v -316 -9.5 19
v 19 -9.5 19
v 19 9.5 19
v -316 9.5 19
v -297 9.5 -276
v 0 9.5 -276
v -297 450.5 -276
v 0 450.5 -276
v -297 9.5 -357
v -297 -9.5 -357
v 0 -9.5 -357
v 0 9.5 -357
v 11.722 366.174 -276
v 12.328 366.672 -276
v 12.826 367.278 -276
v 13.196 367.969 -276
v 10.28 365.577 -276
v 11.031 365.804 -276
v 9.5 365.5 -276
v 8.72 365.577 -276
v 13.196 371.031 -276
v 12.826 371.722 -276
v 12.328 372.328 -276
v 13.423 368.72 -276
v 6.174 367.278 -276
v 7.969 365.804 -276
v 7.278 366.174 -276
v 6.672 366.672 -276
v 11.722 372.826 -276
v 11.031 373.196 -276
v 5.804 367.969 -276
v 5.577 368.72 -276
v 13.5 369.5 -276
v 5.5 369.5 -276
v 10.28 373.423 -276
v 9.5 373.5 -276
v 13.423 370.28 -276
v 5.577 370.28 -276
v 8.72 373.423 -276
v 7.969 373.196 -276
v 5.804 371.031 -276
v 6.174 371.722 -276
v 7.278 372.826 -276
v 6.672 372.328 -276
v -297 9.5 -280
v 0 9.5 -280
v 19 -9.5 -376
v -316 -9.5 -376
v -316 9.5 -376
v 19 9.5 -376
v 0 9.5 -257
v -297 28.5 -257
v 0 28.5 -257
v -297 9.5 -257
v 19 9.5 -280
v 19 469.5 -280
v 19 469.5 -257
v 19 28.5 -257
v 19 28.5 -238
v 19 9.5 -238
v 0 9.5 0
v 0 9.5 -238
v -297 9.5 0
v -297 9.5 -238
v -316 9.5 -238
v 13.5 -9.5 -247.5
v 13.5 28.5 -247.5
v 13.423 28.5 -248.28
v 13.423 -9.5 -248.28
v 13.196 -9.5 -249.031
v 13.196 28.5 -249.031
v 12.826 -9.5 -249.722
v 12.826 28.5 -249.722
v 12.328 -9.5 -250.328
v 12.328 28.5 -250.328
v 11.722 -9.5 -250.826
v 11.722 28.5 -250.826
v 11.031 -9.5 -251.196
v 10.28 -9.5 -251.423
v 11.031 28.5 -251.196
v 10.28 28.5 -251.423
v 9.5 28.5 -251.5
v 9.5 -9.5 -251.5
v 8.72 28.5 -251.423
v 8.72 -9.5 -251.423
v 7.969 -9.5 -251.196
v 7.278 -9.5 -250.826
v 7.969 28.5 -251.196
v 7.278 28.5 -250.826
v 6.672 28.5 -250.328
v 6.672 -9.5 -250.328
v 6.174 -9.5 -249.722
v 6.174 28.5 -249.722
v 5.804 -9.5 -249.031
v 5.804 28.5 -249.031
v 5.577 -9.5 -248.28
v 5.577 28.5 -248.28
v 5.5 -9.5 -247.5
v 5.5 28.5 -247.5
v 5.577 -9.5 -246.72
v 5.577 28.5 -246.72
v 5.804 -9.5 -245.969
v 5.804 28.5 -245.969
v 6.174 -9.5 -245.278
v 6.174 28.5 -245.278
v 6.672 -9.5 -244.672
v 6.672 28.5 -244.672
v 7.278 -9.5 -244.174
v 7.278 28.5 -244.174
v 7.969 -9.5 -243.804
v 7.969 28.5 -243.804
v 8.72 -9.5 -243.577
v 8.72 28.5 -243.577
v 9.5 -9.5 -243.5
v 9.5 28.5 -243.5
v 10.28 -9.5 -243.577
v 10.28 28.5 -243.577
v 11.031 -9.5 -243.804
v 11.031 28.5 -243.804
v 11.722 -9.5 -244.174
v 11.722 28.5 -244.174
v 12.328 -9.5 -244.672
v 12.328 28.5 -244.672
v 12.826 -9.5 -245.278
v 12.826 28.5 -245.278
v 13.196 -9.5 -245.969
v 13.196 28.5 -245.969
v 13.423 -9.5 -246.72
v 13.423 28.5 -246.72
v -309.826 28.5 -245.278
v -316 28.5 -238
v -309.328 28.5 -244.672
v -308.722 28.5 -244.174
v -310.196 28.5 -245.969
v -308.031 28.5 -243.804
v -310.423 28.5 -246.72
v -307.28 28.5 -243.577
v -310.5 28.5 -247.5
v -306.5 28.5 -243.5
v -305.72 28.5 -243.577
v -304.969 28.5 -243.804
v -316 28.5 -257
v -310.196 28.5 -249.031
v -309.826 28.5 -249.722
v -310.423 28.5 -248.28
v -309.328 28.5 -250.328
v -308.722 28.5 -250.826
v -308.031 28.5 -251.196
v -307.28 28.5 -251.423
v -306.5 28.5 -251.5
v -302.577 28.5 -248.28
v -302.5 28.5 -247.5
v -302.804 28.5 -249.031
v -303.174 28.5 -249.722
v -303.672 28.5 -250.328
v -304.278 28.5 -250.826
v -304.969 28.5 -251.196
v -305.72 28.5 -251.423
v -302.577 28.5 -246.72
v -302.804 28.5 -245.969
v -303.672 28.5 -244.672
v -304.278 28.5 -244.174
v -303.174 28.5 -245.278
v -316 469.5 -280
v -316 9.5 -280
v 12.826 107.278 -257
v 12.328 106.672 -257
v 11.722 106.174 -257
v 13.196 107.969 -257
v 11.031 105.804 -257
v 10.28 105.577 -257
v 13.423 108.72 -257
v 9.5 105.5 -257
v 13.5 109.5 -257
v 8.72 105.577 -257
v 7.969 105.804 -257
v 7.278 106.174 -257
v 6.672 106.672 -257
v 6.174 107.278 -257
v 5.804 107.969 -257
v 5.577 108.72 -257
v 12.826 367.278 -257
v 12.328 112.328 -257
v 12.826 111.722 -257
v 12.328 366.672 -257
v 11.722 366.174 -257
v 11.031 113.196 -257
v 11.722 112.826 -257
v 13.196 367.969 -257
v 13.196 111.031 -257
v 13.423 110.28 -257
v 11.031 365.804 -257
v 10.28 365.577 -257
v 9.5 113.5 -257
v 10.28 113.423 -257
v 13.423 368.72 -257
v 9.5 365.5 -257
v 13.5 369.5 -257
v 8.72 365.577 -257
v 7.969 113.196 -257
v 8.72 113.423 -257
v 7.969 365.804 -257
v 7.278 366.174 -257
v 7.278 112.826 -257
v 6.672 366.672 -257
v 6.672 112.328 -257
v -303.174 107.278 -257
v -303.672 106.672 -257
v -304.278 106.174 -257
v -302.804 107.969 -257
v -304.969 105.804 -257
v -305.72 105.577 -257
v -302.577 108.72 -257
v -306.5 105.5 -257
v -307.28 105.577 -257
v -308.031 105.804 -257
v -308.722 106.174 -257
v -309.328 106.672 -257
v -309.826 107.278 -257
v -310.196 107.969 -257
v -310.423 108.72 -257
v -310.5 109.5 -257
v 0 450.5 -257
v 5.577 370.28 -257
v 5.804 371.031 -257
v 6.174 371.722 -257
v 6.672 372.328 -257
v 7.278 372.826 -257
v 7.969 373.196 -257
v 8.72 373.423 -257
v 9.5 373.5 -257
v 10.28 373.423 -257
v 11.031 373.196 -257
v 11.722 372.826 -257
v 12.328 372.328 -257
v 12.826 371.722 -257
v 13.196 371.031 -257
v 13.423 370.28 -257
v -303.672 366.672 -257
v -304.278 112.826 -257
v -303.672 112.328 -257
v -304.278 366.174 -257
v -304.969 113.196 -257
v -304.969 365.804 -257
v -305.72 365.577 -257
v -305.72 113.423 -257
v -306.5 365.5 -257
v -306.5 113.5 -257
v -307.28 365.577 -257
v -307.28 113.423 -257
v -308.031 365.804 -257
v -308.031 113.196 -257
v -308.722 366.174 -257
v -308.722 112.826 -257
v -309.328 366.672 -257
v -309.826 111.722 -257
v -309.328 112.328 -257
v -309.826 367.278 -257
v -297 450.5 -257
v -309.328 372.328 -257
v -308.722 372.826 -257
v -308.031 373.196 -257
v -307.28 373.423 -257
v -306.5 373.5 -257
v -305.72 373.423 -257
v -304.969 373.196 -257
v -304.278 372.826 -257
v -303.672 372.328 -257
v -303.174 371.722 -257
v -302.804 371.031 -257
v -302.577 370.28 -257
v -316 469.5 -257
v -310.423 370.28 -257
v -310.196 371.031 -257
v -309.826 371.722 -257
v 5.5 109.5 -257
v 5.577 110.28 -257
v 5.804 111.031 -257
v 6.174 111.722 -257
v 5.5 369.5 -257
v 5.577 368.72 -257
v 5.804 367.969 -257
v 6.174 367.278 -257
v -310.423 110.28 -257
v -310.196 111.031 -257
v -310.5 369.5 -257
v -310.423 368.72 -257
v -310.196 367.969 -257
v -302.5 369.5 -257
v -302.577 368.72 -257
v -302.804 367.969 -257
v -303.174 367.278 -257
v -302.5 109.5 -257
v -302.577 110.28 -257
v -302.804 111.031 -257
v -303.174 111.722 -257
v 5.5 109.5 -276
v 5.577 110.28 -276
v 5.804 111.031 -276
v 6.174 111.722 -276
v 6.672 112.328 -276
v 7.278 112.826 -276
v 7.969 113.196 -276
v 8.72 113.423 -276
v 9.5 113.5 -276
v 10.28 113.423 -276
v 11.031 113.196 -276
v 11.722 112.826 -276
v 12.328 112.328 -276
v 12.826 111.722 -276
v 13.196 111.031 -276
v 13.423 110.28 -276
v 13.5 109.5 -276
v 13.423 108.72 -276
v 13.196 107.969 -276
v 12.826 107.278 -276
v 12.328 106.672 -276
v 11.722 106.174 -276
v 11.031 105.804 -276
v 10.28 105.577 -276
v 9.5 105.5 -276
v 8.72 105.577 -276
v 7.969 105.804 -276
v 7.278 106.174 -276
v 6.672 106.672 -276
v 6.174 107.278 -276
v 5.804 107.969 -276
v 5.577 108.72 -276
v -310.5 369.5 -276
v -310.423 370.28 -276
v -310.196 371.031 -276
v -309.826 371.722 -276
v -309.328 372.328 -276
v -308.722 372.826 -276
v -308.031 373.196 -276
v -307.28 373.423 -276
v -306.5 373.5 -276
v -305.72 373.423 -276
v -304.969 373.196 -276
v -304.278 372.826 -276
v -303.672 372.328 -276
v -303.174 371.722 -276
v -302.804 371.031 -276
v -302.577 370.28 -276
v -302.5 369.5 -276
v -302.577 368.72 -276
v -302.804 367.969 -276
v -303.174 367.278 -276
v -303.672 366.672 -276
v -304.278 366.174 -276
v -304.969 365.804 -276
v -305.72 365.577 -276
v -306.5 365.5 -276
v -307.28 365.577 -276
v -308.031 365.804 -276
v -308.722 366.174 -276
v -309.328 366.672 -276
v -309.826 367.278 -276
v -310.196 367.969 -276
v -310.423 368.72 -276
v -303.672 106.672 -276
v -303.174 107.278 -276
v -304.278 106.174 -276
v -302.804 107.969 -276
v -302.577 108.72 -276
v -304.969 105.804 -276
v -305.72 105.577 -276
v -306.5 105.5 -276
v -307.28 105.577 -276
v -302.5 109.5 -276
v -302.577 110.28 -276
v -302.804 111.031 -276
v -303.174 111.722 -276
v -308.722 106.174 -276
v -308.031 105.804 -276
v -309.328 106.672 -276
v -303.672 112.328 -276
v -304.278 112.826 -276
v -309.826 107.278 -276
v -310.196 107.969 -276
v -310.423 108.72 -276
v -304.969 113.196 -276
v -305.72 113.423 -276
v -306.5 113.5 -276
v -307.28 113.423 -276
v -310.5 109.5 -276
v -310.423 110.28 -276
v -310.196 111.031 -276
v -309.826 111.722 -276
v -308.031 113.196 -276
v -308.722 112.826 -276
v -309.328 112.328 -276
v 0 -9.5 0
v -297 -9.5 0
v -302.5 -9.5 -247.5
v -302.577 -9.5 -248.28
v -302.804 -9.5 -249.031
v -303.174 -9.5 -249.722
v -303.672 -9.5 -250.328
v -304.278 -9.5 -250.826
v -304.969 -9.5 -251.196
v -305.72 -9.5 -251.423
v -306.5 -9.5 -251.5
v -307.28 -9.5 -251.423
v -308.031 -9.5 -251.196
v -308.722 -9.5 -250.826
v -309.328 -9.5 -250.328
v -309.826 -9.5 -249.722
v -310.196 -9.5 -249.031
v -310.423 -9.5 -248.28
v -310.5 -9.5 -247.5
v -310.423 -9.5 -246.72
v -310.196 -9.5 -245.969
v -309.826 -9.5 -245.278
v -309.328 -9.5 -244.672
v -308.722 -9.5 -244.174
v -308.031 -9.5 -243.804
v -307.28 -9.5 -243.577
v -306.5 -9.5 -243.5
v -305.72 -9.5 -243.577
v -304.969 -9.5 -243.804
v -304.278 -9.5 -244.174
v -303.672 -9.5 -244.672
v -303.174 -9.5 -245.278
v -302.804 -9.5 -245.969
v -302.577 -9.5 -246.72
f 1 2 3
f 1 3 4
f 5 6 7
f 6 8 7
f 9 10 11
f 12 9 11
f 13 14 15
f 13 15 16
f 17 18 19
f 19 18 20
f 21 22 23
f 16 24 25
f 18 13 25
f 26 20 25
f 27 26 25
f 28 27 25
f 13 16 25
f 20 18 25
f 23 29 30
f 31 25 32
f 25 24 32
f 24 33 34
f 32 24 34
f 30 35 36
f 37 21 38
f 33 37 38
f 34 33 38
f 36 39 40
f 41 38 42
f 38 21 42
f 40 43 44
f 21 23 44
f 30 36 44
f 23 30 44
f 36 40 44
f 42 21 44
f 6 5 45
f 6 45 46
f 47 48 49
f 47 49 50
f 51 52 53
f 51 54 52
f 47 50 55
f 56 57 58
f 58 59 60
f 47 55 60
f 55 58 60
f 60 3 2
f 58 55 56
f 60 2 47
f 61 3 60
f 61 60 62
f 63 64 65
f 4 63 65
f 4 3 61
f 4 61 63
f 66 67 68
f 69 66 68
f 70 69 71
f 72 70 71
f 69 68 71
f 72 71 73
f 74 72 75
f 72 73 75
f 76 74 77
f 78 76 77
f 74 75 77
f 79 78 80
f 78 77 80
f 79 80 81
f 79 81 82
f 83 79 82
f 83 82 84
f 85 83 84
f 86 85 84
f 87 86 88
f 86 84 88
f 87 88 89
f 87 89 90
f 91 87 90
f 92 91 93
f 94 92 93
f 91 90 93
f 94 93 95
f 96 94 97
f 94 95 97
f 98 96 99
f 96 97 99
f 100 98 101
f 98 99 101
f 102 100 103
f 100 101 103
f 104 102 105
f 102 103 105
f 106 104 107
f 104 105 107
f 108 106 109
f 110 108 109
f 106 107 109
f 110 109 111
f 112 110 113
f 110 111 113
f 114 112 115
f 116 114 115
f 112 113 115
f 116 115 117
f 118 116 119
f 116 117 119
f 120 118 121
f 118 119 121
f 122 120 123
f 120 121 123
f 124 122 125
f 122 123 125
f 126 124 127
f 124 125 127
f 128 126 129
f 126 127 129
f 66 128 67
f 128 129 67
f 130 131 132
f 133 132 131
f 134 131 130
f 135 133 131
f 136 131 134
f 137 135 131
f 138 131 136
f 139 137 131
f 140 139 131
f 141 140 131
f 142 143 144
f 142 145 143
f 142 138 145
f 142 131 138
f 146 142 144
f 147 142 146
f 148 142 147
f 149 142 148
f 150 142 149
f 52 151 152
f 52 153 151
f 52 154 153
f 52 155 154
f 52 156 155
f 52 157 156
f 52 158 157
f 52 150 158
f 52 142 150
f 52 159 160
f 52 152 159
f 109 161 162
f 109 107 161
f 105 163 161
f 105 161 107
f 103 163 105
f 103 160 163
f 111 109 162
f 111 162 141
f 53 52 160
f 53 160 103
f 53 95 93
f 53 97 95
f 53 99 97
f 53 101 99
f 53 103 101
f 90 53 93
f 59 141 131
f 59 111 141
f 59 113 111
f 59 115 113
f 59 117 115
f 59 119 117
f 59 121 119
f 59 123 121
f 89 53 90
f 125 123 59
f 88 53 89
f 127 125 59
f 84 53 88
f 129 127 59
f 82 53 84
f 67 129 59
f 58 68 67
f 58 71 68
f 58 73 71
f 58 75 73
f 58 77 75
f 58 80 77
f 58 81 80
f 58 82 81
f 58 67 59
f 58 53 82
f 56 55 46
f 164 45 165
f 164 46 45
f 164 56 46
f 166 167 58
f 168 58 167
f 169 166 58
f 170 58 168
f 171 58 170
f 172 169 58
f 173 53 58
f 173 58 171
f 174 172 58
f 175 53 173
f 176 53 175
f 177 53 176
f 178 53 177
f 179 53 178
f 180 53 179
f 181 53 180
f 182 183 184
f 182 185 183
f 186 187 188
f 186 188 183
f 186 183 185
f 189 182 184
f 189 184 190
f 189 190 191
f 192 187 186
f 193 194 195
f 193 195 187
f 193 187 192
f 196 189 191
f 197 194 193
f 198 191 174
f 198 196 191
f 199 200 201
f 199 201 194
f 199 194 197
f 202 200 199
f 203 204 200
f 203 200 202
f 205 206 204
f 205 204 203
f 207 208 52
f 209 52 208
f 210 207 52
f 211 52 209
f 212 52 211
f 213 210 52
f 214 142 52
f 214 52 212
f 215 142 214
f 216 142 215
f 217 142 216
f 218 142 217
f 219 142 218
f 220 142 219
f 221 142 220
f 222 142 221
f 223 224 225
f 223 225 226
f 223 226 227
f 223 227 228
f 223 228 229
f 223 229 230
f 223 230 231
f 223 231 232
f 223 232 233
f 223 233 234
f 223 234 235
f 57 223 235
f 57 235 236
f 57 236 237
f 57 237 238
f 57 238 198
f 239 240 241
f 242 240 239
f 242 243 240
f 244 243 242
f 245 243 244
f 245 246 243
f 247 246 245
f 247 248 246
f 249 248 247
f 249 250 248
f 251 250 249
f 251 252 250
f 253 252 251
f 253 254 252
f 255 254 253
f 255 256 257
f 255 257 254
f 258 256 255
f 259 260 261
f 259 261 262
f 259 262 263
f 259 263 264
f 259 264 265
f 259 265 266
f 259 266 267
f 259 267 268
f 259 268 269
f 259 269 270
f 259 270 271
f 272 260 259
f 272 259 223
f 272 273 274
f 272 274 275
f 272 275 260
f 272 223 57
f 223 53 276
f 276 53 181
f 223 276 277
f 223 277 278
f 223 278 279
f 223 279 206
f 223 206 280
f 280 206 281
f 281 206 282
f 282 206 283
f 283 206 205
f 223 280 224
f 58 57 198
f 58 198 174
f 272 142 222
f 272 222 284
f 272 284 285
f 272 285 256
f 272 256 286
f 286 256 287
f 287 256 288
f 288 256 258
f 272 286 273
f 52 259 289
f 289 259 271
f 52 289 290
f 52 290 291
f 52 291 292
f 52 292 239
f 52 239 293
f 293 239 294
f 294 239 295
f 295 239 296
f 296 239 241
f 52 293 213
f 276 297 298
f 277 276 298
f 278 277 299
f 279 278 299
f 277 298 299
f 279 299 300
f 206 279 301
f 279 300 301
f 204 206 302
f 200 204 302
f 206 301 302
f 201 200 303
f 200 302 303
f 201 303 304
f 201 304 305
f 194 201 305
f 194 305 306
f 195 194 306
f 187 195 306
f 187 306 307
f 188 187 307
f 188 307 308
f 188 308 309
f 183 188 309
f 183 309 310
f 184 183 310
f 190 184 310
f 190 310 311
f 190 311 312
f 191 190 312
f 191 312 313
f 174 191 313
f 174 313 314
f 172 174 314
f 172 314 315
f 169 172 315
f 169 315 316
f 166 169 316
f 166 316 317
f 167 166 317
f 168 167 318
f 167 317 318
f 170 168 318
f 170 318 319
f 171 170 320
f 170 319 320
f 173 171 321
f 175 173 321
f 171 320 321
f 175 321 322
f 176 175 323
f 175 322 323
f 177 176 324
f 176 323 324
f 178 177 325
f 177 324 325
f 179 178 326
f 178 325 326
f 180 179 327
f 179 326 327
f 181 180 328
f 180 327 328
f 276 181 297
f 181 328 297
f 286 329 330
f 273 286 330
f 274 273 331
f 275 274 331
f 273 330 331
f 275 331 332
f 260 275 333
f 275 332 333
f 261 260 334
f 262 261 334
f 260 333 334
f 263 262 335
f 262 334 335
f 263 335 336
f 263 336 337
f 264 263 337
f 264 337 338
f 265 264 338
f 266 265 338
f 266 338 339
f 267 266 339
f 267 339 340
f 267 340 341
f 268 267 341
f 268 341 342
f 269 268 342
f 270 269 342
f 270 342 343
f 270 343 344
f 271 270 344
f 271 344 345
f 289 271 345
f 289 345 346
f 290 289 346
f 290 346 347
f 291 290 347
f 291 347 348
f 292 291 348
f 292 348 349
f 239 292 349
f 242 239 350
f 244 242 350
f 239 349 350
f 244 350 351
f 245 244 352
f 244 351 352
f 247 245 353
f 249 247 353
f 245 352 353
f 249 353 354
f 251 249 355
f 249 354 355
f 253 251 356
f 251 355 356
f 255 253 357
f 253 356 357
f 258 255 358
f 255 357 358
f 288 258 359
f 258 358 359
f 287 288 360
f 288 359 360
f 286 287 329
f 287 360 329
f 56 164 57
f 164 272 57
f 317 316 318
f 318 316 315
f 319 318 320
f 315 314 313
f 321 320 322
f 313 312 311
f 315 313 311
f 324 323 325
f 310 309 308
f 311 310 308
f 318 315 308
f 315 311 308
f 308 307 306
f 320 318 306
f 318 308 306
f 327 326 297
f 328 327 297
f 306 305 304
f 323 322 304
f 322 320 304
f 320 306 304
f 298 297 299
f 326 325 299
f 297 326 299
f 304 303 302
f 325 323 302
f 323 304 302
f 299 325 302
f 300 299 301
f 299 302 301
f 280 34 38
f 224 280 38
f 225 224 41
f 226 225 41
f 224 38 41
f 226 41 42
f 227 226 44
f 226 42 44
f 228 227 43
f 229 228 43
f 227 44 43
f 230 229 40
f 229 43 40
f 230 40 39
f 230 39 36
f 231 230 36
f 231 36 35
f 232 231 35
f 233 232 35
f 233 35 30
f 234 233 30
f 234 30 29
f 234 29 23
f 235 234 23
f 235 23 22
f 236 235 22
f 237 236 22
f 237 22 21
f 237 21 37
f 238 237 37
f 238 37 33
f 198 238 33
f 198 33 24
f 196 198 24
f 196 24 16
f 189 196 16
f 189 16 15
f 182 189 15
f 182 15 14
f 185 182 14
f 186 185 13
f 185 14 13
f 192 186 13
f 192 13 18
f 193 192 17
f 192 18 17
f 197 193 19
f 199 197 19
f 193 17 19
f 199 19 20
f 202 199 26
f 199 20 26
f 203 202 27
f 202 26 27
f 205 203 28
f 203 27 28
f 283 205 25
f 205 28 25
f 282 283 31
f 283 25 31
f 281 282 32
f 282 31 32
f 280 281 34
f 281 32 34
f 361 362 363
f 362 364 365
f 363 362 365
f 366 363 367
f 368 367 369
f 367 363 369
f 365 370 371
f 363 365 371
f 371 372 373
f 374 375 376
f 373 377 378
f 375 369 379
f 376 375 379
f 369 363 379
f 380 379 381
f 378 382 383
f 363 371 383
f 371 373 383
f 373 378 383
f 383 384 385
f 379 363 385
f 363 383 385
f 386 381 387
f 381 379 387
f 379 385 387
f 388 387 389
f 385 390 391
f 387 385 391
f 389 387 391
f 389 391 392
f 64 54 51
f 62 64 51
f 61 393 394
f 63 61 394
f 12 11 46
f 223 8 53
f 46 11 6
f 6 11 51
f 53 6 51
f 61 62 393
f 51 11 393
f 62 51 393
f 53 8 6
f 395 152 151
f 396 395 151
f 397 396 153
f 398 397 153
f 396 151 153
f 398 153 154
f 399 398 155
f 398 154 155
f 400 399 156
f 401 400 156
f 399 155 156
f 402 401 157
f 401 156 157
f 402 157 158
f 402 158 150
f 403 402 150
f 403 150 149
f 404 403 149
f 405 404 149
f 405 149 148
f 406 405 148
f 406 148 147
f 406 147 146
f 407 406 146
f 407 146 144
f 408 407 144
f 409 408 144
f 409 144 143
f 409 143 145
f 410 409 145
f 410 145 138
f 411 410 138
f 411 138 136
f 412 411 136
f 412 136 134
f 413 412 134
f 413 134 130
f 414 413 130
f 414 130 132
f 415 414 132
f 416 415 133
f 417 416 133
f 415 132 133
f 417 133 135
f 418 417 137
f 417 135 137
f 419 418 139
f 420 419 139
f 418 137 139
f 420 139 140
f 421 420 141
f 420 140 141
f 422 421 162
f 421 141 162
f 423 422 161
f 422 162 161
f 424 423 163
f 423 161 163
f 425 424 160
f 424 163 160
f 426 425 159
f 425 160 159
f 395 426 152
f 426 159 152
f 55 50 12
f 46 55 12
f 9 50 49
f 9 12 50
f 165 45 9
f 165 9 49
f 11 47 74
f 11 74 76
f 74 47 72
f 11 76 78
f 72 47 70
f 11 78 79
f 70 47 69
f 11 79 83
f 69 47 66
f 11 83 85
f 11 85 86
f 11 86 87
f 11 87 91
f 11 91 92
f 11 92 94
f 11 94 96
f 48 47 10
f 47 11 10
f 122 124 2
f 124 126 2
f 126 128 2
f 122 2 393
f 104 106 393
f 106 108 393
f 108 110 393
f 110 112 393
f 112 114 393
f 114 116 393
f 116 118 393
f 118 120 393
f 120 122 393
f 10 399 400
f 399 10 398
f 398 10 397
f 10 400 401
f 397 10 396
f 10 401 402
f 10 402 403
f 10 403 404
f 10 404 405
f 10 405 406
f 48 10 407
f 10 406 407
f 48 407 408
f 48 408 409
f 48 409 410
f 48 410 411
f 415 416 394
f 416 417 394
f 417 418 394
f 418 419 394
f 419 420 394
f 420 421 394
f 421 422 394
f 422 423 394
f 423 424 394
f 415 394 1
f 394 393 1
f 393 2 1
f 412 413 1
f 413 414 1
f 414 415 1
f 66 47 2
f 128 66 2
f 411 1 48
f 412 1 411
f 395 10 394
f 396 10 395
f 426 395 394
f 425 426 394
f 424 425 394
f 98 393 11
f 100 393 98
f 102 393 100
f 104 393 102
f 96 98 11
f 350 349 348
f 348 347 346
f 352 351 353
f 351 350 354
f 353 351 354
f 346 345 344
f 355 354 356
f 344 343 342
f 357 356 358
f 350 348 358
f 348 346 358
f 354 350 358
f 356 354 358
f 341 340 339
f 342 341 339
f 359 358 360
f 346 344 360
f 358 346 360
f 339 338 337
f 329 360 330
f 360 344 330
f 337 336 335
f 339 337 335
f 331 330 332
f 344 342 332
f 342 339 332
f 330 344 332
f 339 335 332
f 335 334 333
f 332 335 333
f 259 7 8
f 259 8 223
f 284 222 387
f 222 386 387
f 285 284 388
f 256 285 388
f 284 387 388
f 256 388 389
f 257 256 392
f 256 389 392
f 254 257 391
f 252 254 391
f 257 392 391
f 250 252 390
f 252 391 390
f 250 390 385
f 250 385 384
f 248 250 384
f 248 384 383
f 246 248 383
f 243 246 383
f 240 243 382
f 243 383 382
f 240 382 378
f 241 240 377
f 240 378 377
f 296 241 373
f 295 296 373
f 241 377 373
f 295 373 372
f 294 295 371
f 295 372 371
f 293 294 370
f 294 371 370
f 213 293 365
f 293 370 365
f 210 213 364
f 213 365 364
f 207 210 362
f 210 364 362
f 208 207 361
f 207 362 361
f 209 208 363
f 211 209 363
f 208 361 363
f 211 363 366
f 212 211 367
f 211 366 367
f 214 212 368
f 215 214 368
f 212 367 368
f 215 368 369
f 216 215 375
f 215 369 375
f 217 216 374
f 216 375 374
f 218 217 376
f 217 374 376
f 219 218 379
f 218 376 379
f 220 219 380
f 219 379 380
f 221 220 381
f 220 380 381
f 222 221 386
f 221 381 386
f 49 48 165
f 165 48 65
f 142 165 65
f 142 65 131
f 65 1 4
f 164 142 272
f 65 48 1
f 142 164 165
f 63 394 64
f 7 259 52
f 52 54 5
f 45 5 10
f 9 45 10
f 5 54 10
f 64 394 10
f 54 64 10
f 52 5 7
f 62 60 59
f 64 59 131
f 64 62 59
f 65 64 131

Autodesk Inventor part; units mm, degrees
ref_plane "YZ Plane" through (0, 0, 0) normal (1, 0, 0) x (0, 1, 0)
ref_plane "XZ Plane" through (0, 0, 0) normal (0, 1, 0) x (-1, 0, 0)
ref_plane "XY Plane" through (0, 0, 0) normal (0, 0, 1) x (1, 0, 0)
sketch "Sketch1" plane through (0, 0, 0) normal (0, 1, 0) x (-1, 0, 0)
  line L0 (0, 0) -> (297, 0)
  line L1 (297, 0) -> (297, -357)
  line L2 (297, -357) -> (0, -357)
  line L3 (0, -357) -> (0, 0)
  line L4 (-19, 19) -> (316, 19)
  line L5 (316, 19) -> (316, -376)
  line L6 (316, -376) -> (-19, -376)
  line L7 (-19, -376) -> (-19, 19)
  dimension "d2" = 19
  dimension "d3" = 19
  dimension "d4" = 19
  dimension "d5" = 19
  dimension "d6" = 395
  dimension "d7" = 335
extrude "Extrusion1" add sketch "Sketch1" along normal mid plane 19
sketch "Sketch3" plane through (0, 9.5, 0) normal (0, 1, 0) x (1, 0, 0)
  line L0 (-316, 376) -> (-316, -19) projected
  line L1 (-316, 276) -> (-297, 276)
  line L2 (-297, 276) -> (-297, 257)
  line L3 (-297, 257) -> (-316, 257)
  line L4 (-316, 257) -> (-316, 276)
  line L5 (0, 357) -> (0, 0) projected
  line L6 (19, 376) -> (19, -19) projected
  line L7 (0, 276) -> (19, 276)
  line L8 (19, 276) -> (19, 257)
  line L9 (19, 257) -> (0, 257)
  line L10 (0, 257) -> (0, 276)
  line L11 (19, 376) -> (-316, 376) projected
  dimension "d26" = 19
  dimension "d27" = 19
  dimension "d28" = 100
extrude "Extrusion2" add sketch "Sketch3" along normal blind 460
sketch "Sketch4" plane through (-297, -9.5, 0) normal (1, 0, 0) x (0, 0, -1)
  line L0 (257, 19) -> (257, 479) projected
  line L1 (276, 19) -> (276, 479) projected
  line L2 (257, 479) -> (276, 479)
  line L3 (276, 479) -> (276, 460)
  line L4 (276, 460) -> (257, 460)
  line L5 (257, 460) -> (257, 479)
  point P0 (0, 9.5)
  dimension "d31" = 19
extrude "Extrusion3" add sketch "Sketch4" along normal blind 316
sketch "Sketch5" plane through (19, 469.5, -276) normal (0, 0, -1) x (-1, 0, 0)
  circle A0 centre (9.5, -100) radius 4
  circle A1 centre (325.5, -100) radius 4
  circle A2 centre (9.5, -360) radius 4
  circle A3 centre (325.5, -360) radius 4
  line L0 (335, -460) -> (335, 0) projected
  line L1 (0, 0) -> (335, 0) projected
  line L2 (19, -460) -> (19, -19) projected
  line L3 (0, -460) -> (335, -460) projected
  line L4 (0, -460) -> (0, 0) projected
  point P0 (19, -469.5)
  dimension "d34" = 8
  dimension "d35" = 8
  dimension "d36" = 8
  dimension "d37" = 8
  dimension "d38" = 9.5
  dimension "d39" = 100
  dimension "d40" = 100
  dimension "d41" = 9.5
  dimension "d42" = 9.5
  dimension "d43" = 100
  dimension "d44" = 100
  dimension "d45" = 9.5
extrude "Extrusion4" cut sketch "Sketch5" against normal blind 19 contours A0 | A1 | A2 | A3
sketch "Sketch6" plane through (0, 9.5, 0) normal (0, 1, 0) x (1, 0, 0)
  line L0 (19, 376) -> (19, -19) projected
  line L1 (-316, 257) -> (19, 257)
  line L2 (19, 257) -> (19, 238)
  line L3 (19, 238) -> (-316, 238)
  line L4 (-316, 238) -> (-316, 257)
  line L5 (19, 376) -> (-316, 376) projected
  point P0 (0, 0)
  dimension "d48" = 19
  dimension "d49" = 335
  dimension "d51" = 119
extrude "Extrusion5" add sketch "Sketch6" along normal blind 19
sketch "Sketch7" plane through (0, 28.5, 0) normal (0, 1, 0) x (1, 0, 0)
  circle A0 centre (-306.5, 247.5) radius 4
  circle A1 centre (9.5, 247.5) radius 4
  line L0 (19, 238) -> (19, 257) projected
  line L1 (-316, 238) -> (19, 238) projected
  line L2 (-316, 257) -> (-316, 238) projected
  point P0 (0, 0)
  dimension "d54" = 8
  dimension "d55" = 8
  dimension "d56" = 9.5
  dimension "d57" = 9.5
  dimension "d58" = 9.5
  dimension "d59" = 9.5
extrude "Extrusion6" cut sketch "Sketch7" against normal blind 39
sketch "Sketch8" plane through (19, 469.5, -276) normal (0, 0, -1) x (-1, 0, 0)
  line L0 (335, -460) -> (0, -460) projected
  line L1 (335, -460) -> (335, 0) projected
  line L2 (0, -460) -> (335, -460)
  line L3 (335, -460) -> (335, 0)
  line L4 (335, 0) -> (0, 0)
  line L5 (0, 0) -> (0, -460)
  point P0 (19, -469.5)
extrude "Extrusion7" add sketch "Sketch8" along normal blind 4
properties part number "Test stand v1.2"
